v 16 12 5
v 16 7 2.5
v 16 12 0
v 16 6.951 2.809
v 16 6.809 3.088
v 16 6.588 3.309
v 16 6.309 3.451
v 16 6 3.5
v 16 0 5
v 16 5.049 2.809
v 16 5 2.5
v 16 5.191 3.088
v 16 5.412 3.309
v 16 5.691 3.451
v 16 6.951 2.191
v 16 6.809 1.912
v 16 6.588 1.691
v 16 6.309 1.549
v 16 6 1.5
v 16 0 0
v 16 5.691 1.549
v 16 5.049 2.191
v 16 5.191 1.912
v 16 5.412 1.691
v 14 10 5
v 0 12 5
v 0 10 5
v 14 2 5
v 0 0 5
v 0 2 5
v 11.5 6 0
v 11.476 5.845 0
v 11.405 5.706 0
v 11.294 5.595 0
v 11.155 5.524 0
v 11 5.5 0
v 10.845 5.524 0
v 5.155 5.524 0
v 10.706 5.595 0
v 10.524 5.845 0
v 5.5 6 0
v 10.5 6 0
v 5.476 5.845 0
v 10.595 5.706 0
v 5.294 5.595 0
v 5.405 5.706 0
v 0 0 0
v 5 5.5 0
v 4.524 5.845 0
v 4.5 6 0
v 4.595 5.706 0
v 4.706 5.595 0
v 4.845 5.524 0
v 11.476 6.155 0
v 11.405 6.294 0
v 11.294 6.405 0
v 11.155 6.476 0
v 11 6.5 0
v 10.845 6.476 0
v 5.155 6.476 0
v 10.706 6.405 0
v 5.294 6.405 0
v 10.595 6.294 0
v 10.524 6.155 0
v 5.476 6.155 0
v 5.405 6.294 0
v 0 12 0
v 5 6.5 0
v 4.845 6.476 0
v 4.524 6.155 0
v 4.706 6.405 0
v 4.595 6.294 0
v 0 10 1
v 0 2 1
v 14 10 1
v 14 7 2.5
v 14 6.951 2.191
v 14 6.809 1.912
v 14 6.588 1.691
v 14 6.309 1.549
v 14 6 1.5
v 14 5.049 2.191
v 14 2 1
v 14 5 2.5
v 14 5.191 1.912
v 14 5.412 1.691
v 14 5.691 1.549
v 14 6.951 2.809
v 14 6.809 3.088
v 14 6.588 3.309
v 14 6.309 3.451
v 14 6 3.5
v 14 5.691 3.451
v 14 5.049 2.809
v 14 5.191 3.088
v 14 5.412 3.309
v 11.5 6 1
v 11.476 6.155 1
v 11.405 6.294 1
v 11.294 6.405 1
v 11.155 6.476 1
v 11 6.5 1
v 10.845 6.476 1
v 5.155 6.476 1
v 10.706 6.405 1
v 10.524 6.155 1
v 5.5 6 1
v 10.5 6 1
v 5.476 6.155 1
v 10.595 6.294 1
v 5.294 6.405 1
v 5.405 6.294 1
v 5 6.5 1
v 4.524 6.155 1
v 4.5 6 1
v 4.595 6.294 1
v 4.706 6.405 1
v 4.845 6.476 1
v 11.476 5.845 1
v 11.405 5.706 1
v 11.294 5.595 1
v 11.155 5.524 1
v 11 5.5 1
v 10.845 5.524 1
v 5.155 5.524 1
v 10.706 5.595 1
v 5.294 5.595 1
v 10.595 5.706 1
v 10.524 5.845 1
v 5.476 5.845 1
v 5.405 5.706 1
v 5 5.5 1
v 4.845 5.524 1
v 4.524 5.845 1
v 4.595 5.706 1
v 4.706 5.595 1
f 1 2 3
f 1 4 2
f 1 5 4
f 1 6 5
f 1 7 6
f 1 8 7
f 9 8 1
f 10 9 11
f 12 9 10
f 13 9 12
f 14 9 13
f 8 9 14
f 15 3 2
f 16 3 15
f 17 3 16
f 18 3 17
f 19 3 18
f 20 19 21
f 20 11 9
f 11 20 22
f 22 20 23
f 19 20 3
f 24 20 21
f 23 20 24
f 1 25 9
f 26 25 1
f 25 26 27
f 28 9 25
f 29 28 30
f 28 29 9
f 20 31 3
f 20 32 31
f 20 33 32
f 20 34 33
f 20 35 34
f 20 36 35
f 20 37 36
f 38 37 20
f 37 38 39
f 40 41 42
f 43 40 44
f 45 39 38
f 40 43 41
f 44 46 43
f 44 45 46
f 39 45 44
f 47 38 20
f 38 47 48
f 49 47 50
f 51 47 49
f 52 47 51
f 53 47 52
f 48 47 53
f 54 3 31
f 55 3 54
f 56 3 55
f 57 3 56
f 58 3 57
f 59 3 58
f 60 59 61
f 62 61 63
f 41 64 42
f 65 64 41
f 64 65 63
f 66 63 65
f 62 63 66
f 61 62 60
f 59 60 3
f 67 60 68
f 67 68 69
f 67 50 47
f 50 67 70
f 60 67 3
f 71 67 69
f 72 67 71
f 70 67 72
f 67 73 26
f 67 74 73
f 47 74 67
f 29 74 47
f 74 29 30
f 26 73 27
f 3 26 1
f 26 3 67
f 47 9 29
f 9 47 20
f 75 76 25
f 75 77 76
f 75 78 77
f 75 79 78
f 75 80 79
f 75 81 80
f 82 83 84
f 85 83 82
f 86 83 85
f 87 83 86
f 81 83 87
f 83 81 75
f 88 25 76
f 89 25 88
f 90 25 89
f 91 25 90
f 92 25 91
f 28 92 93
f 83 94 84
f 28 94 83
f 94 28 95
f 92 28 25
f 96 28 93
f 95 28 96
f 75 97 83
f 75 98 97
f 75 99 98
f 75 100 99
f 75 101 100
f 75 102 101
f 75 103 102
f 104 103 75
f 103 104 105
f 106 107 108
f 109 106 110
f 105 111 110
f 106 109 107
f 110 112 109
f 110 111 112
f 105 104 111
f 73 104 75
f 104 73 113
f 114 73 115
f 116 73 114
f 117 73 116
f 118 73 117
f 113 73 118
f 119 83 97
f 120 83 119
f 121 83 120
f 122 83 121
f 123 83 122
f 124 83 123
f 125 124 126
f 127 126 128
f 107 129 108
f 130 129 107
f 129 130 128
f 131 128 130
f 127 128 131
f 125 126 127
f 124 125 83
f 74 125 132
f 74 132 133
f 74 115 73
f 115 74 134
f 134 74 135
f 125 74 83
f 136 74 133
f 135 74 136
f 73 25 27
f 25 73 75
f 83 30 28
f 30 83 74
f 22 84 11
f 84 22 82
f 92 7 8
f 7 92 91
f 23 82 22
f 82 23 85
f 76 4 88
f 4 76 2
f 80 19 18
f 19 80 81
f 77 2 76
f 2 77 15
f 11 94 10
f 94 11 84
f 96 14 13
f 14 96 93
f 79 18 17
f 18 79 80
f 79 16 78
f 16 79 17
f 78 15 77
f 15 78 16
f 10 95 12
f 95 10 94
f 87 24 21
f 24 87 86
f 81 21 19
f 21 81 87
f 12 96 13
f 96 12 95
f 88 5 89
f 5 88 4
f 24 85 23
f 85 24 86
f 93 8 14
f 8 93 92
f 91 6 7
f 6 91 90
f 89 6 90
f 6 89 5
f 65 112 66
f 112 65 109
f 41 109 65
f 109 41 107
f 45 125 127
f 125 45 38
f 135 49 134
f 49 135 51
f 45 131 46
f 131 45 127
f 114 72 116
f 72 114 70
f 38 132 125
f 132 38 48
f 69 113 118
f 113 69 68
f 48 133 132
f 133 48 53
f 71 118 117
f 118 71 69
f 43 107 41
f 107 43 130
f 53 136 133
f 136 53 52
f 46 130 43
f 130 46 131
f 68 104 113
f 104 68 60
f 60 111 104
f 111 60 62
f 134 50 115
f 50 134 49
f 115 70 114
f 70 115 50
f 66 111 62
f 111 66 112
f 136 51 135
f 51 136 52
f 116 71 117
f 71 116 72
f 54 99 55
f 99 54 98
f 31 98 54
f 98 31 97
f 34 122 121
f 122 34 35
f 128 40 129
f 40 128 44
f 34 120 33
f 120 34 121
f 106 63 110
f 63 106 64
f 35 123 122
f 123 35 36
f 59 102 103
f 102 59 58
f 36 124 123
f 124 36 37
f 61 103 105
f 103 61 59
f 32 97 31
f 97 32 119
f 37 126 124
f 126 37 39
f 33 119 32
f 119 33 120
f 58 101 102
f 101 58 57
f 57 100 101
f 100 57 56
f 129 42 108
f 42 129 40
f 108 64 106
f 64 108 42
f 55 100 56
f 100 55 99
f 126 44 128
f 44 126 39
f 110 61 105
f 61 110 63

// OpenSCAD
*translate([12,6,16.5])
rotate([180,0,0])
rotate([0,90,0])
9g_motor();

difference() {
cube([16,12,5]);
translate([0,2,1])
cube([14,8,4]);

translate([10,6,2.5])
rotate([0,90,0])
cylinder($fn=20,d=2,h=10);

translate([5,6,0])
  cylinder($fn=20,d=1,h=10);

translate([11,6,0])
  cylinder($fn=20,d=1,h=10);    

}



module 9g_motor(){
	difference(){			
		union(){
			color("steel blue") cube([23,12.7,22], center=true);
			color("steel blue") translate([0,0,5]) cube([32,12,2], center=true);
			color("steel blue") translate([5.5,0,2.75]) cylinder(r=6, h=25.75, $fn=20, center=true);
			color("steel blue") translate([-.5,0,2.75]) cylinder(r=1, h=25.75, $fn=20, center=true);
			color("steel blue") translate([-1,0,2.75]) cube([5,5.6,24.5], center=true);		
			color("white") translate([5.5,0,3.65]) cylinder(r=2.35, h=29.25, $fn=20, center=true);				
		}
		//translate([10,0,-11]) rotate([0,-30,0]) cube([8,13,4], center=true);
		for ( hole = [14,-14] ){
			translate([hole,0,5]) cylinder(r=2.2, h=4, $fn=20, center=true);
		}	
	}
}
